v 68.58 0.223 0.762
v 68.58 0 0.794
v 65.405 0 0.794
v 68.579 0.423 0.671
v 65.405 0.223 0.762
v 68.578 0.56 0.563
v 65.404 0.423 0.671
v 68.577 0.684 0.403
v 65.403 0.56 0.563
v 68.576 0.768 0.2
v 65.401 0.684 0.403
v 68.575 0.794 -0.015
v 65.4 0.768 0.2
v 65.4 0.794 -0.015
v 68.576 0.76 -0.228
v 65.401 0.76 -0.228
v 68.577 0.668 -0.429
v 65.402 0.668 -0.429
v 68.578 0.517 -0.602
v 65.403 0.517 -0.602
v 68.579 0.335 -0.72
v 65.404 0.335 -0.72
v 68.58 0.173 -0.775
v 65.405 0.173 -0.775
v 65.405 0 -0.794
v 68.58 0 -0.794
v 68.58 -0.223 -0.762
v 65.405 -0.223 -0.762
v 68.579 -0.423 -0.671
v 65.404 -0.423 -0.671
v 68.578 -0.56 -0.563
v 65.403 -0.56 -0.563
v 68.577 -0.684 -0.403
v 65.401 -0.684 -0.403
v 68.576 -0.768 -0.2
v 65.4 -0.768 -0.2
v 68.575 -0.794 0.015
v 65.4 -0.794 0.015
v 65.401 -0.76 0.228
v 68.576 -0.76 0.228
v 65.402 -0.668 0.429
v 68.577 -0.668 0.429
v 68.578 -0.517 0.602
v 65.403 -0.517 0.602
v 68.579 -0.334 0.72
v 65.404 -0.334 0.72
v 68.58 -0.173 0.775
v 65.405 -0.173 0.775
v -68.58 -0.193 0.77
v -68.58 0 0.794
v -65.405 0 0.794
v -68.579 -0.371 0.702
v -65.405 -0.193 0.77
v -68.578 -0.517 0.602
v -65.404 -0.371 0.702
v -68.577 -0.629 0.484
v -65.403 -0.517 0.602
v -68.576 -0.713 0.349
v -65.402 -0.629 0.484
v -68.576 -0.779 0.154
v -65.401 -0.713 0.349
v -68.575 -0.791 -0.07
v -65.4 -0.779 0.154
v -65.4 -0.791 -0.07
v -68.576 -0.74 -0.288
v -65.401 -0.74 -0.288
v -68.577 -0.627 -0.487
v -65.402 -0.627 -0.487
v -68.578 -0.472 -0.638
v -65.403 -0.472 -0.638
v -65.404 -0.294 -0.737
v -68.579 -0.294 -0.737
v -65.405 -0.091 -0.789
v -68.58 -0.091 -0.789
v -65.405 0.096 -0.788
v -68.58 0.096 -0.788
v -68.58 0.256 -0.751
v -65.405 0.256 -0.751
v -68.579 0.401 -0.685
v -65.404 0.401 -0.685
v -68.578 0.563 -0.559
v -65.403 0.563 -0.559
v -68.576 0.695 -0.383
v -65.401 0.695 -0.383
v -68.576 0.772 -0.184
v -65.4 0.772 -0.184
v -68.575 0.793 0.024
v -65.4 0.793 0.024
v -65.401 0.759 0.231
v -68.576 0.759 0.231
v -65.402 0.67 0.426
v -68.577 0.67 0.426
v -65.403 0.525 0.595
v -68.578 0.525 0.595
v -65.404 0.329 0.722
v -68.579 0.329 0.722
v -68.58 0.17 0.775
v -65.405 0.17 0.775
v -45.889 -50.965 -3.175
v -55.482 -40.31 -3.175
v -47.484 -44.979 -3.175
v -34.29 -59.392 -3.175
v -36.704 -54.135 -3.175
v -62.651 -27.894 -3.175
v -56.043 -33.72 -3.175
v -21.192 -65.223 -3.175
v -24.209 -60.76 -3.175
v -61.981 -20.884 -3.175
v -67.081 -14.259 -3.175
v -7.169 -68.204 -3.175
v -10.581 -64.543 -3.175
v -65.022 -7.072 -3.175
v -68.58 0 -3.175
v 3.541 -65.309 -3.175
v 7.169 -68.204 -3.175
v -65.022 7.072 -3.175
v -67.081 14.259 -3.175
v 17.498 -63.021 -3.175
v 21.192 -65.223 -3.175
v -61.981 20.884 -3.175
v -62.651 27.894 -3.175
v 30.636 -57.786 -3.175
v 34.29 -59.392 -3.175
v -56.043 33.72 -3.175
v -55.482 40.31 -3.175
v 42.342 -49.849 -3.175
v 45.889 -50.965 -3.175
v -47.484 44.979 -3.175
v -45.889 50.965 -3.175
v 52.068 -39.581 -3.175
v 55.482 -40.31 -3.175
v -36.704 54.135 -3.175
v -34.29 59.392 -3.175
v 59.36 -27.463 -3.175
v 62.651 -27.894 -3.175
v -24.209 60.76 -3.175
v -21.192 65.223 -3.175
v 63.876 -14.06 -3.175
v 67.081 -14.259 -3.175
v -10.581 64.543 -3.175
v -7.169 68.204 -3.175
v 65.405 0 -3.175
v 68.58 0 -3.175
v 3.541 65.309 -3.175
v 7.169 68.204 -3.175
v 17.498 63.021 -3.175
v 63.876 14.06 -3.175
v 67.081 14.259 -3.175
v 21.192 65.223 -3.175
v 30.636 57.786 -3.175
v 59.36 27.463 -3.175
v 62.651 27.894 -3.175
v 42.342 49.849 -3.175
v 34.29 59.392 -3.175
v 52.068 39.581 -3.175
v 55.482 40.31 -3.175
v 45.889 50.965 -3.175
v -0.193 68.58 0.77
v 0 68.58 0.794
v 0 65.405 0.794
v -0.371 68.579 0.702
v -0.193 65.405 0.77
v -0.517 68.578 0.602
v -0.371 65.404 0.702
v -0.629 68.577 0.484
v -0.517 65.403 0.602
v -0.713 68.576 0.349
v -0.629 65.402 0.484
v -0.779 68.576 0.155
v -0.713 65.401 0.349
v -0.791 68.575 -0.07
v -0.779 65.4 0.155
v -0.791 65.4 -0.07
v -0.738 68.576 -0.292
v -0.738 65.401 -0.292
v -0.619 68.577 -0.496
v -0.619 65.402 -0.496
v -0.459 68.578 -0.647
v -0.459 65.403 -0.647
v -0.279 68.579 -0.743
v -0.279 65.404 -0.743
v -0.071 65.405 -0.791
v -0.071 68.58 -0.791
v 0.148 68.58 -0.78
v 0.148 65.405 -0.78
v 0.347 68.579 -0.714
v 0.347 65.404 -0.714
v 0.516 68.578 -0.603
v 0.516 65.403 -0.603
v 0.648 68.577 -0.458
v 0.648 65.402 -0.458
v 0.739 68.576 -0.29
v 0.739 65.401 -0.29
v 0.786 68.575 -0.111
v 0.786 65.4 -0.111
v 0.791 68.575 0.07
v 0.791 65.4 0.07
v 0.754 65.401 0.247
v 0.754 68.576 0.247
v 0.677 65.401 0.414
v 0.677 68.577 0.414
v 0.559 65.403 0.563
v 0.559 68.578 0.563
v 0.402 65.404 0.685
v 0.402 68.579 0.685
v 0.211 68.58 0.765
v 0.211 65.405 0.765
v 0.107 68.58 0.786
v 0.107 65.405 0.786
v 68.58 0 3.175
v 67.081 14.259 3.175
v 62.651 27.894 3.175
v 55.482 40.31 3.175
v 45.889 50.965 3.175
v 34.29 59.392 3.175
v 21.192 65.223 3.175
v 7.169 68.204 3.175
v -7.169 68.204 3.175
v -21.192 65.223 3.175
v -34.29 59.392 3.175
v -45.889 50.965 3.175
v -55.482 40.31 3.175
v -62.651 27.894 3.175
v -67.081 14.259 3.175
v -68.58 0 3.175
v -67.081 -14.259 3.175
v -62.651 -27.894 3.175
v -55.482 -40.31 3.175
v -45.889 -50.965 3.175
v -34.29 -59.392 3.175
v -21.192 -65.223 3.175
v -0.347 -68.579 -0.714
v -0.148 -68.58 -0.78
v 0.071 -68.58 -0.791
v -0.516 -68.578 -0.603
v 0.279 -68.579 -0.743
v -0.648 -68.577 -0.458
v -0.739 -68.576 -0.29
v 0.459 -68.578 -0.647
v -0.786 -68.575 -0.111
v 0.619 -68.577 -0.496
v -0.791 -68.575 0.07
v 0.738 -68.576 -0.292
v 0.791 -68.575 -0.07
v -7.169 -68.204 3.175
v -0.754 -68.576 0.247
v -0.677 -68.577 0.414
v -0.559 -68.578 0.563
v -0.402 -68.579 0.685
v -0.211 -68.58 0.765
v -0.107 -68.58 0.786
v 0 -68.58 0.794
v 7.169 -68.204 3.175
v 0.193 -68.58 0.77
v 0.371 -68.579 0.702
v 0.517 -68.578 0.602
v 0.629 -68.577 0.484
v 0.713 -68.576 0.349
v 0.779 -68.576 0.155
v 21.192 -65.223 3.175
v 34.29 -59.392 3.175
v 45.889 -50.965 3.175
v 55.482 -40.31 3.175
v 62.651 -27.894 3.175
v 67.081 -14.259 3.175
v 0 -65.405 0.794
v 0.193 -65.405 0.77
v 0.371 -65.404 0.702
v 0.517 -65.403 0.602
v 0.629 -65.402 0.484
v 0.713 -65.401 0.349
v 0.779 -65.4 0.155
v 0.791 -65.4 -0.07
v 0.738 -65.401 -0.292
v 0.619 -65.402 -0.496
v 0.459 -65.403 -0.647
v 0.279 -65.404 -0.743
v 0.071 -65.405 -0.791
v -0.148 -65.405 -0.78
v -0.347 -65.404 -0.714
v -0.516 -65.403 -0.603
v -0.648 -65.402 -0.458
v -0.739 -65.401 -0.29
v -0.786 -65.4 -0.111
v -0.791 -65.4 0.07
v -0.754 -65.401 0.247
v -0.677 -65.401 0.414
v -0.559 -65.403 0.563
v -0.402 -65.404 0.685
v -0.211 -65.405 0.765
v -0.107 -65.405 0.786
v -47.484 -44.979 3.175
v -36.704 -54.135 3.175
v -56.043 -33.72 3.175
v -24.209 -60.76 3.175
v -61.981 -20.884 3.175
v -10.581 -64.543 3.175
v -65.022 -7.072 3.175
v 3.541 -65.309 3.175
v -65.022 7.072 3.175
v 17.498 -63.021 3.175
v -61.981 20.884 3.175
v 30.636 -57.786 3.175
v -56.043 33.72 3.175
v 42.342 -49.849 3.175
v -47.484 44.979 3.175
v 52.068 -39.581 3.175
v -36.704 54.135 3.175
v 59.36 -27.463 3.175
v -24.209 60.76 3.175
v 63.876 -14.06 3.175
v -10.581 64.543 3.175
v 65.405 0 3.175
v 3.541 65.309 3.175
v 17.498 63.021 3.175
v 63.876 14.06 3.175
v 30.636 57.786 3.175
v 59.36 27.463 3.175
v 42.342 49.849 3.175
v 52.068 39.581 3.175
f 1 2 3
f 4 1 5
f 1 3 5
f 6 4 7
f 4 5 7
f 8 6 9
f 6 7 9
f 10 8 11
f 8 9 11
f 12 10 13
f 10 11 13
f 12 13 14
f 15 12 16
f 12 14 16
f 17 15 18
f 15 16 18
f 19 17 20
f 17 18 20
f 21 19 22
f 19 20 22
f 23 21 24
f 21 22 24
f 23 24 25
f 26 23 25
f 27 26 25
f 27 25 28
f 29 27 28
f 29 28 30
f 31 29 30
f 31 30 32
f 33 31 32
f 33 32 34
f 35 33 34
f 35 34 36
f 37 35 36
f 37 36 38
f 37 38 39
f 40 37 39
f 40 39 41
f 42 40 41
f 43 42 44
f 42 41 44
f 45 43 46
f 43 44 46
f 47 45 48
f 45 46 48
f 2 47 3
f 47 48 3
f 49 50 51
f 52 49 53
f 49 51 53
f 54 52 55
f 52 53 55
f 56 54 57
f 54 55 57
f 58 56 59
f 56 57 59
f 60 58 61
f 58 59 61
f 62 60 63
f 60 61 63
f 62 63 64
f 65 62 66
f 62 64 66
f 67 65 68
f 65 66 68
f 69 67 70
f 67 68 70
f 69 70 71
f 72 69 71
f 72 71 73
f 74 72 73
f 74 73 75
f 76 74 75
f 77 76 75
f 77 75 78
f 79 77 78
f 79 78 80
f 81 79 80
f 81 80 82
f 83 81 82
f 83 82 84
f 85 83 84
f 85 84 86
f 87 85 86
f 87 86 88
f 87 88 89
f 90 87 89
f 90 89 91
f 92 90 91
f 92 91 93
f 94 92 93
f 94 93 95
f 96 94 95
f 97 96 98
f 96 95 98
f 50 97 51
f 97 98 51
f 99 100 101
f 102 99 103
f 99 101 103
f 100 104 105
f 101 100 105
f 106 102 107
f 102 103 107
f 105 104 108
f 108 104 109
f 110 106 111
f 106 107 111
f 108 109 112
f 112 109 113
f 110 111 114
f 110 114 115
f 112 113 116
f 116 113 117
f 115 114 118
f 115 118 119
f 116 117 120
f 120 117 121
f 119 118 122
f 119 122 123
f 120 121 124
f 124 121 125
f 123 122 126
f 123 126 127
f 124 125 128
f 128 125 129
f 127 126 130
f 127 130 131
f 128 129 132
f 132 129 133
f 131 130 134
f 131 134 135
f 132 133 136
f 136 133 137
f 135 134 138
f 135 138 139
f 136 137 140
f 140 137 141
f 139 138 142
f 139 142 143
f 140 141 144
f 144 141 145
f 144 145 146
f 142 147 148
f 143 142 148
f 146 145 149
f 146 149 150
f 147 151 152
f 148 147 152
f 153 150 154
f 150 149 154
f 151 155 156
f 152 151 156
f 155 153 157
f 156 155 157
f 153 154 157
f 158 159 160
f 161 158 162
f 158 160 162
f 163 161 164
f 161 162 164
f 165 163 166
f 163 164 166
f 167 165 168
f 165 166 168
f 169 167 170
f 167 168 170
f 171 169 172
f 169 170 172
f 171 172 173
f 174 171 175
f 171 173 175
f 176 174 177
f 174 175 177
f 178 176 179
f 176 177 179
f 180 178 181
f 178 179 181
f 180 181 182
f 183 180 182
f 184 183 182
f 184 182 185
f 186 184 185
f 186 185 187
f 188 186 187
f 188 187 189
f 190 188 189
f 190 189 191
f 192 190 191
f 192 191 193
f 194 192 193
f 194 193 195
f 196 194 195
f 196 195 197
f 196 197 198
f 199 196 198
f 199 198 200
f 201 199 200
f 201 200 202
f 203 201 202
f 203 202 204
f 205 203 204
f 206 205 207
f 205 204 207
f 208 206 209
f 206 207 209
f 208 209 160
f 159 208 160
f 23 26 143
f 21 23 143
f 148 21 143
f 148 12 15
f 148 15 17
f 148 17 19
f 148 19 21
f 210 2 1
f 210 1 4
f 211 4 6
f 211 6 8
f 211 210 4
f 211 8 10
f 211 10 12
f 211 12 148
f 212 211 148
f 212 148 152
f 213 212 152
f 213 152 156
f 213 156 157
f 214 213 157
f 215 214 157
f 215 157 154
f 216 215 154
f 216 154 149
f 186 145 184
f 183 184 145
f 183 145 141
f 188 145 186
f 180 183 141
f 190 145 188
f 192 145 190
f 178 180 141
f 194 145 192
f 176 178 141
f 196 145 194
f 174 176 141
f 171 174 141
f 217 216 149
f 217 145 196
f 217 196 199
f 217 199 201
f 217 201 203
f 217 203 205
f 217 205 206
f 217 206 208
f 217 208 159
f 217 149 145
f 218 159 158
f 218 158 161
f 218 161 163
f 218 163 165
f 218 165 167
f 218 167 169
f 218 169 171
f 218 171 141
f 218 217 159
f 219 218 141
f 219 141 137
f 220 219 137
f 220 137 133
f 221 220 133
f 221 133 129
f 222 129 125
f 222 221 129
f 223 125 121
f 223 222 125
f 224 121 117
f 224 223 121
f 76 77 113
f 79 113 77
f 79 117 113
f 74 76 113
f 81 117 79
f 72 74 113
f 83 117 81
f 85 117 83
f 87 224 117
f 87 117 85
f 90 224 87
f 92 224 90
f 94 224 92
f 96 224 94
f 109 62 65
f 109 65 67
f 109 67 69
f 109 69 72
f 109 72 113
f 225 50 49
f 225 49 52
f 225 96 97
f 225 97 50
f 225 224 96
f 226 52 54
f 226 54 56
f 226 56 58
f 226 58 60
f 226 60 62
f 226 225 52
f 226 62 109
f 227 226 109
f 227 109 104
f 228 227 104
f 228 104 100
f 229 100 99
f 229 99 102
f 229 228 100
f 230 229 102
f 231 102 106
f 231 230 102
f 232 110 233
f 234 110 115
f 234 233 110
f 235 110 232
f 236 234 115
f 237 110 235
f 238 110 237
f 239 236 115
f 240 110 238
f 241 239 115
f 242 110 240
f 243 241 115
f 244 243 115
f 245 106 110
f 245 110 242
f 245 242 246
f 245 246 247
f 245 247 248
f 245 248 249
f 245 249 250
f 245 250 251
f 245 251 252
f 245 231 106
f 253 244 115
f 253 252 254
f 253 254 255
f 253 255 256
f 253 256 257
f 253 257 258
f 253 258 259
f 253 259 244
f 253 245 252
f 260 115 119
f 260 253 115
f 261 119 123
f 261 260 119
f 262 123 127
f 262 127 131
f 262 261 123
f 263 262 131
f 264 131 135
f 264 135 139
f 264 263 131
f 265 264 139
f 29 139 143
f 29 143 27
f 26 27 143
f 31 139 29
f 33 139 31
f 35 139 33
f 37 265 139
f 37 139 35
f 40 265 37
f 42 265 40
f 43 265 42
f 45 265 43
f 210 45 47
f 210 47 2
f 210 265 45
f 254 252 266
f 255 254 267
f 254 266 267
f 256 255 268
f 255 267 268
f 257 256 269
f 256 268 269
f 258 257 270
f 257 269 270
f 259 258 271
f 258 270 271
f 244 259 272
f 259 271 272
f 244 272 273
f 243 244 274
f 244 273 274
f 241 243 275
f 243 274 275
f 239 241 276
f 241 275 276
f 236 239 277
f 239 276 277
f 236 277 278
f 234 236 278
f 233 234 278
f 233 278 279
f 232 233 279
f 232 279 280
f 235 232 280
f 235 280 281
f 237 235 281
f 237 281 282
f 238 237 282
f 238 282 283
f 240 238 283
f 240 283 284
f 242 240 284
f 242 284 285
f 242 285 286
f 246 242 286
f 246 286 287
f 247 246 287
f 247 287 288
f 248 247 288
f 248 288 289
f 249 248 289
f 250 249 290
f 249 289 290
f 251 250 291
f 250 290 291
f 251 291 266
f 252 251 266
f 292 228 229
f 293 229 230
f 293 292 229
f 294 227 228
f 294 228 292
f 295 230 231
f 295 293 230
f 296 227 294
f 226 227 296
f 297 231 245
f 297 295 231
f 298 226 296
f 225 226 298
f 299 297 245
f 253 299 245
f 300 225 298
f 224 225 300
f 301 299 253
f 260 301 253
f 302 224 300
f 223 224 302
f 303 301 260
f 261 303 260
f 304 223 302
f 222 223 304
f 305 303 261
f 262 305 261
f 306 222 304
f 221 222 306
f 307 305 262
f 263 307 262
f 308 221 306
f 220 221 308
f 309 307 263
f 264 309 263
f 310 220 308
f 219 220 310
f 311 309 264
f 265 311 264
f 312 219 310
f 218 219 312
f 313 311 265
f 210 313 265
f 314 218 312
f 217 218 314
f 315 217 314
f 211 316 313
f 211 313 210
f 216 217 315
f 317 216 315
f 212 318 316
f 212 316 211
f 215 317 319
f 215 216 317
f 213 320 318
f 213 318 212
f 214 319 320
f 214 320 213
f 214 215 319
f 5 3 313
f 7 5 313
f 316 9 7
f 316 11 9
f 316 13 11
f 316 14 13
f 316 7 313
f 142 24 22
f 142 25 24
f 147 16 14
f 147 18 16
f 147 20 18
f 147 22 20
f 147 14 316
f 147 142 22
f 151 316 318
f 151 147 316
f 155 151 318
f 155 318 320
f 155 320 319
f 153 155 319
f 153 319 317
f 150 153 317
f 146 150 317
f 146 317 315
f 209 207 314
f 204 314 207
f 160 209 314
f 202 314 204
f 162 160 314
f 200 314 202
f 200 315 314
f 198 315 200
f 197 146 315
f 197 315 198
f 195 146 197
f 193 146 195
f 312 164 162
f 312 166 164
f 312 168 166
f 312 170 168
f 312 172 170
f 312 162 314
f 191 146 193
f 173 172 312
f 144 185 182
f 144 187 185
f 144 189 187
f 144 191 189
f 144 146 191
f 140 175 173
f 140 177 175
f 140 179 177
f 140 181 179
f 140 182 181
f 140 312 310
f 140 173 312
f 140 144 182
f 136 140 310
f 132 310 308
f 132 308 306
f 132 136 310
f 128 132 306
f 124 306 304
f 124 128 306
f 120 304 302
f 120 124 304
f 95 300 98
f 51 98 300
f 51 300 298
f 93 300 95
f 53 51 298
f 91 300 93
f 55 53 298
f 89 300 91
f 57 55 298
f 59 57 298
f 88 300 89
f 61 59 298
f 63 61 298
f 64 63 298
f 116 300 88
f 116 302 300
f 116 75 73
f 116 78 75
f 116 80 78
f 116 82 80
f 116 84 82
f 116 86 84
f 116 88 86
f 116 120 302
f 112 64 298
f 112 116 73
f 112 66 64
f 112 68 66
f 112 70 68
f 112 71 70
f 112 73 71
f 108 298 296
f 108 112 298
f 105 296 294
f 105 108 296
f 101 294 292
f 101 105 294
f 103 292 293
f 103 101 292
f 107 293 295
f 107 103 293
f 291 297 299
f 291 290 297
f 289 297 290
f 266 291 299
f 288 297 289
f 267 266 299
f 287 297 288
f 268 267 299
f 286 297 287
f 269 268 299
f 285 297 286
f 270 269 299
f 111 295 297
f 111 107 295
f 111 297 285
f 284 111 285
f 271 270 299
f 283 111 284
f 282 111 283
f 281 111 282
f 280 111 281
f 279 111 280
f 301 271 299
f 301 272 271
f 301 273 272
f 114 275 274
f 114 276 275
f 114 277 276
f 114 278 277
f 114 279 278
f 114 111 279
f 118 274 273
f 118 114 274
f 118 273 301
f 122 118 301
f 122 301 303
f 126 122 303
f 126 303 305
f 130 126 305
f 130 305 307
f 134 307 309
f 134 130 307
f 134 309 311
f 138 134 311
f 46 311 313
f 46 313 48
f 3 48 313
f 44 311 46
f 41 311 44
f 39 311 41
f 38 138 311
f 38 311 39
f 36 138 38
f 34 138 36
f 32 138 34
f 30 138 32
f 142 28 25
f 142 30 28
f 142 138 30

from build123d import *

# Parameters (mm, degrees)
SKETCH3_R           = 68.58
SKETCH3_R_2         = 65.405
BOSS_EXTRUDE1_DEPTH = 3.175
SKETCH4_R           = 0.79375
CUT_EXTRUDE1_DEPTH  = 98.038721266
CIRPATTERN1_COUNT   = 4


with BuildPart() as part:
    # Sketch3 → Boss-Extrude1 (new, symmetric)
    with BuildSketch(Plane.XY):
        Circle(SKETCH3_R)
        Circle(SKETCH3_R_2, mode=Mode.SUBTRACT)
    extrude(amount=BOSS_EXTRUDE1_DEPTH, both=True)

    # Sketch4 → Cut-Extrude1 (cut, through all)
    with BuildSketch(Plane(origin=(0, 0, 0), x_dir=(1, 0, 0), z_dir=(0, 1, 0))):
        with Locations(Location((0, 0, 0), (0, 0, 270))):
            Circle(SKETCH4_R)
    cut_extrude1 = extrude(amount=-CUT_EXTRUDE1_DEPTH, mode=Mode.SUBTRACT)

    # CirPattern1: Cut-Extrude1 ×4 about axis
    cirpattern1_axis = Axis((0, 0, 3.175), (0, 0, -1))
    for i in range(1, CIRPATTERN1_COUNT):
        add(cut_extrude1.rotate(cirpattern1_axis, i * 360 / CIRPATTERN1_COUNT), mode=Mode.SUBTRACT)


solid = part.part
